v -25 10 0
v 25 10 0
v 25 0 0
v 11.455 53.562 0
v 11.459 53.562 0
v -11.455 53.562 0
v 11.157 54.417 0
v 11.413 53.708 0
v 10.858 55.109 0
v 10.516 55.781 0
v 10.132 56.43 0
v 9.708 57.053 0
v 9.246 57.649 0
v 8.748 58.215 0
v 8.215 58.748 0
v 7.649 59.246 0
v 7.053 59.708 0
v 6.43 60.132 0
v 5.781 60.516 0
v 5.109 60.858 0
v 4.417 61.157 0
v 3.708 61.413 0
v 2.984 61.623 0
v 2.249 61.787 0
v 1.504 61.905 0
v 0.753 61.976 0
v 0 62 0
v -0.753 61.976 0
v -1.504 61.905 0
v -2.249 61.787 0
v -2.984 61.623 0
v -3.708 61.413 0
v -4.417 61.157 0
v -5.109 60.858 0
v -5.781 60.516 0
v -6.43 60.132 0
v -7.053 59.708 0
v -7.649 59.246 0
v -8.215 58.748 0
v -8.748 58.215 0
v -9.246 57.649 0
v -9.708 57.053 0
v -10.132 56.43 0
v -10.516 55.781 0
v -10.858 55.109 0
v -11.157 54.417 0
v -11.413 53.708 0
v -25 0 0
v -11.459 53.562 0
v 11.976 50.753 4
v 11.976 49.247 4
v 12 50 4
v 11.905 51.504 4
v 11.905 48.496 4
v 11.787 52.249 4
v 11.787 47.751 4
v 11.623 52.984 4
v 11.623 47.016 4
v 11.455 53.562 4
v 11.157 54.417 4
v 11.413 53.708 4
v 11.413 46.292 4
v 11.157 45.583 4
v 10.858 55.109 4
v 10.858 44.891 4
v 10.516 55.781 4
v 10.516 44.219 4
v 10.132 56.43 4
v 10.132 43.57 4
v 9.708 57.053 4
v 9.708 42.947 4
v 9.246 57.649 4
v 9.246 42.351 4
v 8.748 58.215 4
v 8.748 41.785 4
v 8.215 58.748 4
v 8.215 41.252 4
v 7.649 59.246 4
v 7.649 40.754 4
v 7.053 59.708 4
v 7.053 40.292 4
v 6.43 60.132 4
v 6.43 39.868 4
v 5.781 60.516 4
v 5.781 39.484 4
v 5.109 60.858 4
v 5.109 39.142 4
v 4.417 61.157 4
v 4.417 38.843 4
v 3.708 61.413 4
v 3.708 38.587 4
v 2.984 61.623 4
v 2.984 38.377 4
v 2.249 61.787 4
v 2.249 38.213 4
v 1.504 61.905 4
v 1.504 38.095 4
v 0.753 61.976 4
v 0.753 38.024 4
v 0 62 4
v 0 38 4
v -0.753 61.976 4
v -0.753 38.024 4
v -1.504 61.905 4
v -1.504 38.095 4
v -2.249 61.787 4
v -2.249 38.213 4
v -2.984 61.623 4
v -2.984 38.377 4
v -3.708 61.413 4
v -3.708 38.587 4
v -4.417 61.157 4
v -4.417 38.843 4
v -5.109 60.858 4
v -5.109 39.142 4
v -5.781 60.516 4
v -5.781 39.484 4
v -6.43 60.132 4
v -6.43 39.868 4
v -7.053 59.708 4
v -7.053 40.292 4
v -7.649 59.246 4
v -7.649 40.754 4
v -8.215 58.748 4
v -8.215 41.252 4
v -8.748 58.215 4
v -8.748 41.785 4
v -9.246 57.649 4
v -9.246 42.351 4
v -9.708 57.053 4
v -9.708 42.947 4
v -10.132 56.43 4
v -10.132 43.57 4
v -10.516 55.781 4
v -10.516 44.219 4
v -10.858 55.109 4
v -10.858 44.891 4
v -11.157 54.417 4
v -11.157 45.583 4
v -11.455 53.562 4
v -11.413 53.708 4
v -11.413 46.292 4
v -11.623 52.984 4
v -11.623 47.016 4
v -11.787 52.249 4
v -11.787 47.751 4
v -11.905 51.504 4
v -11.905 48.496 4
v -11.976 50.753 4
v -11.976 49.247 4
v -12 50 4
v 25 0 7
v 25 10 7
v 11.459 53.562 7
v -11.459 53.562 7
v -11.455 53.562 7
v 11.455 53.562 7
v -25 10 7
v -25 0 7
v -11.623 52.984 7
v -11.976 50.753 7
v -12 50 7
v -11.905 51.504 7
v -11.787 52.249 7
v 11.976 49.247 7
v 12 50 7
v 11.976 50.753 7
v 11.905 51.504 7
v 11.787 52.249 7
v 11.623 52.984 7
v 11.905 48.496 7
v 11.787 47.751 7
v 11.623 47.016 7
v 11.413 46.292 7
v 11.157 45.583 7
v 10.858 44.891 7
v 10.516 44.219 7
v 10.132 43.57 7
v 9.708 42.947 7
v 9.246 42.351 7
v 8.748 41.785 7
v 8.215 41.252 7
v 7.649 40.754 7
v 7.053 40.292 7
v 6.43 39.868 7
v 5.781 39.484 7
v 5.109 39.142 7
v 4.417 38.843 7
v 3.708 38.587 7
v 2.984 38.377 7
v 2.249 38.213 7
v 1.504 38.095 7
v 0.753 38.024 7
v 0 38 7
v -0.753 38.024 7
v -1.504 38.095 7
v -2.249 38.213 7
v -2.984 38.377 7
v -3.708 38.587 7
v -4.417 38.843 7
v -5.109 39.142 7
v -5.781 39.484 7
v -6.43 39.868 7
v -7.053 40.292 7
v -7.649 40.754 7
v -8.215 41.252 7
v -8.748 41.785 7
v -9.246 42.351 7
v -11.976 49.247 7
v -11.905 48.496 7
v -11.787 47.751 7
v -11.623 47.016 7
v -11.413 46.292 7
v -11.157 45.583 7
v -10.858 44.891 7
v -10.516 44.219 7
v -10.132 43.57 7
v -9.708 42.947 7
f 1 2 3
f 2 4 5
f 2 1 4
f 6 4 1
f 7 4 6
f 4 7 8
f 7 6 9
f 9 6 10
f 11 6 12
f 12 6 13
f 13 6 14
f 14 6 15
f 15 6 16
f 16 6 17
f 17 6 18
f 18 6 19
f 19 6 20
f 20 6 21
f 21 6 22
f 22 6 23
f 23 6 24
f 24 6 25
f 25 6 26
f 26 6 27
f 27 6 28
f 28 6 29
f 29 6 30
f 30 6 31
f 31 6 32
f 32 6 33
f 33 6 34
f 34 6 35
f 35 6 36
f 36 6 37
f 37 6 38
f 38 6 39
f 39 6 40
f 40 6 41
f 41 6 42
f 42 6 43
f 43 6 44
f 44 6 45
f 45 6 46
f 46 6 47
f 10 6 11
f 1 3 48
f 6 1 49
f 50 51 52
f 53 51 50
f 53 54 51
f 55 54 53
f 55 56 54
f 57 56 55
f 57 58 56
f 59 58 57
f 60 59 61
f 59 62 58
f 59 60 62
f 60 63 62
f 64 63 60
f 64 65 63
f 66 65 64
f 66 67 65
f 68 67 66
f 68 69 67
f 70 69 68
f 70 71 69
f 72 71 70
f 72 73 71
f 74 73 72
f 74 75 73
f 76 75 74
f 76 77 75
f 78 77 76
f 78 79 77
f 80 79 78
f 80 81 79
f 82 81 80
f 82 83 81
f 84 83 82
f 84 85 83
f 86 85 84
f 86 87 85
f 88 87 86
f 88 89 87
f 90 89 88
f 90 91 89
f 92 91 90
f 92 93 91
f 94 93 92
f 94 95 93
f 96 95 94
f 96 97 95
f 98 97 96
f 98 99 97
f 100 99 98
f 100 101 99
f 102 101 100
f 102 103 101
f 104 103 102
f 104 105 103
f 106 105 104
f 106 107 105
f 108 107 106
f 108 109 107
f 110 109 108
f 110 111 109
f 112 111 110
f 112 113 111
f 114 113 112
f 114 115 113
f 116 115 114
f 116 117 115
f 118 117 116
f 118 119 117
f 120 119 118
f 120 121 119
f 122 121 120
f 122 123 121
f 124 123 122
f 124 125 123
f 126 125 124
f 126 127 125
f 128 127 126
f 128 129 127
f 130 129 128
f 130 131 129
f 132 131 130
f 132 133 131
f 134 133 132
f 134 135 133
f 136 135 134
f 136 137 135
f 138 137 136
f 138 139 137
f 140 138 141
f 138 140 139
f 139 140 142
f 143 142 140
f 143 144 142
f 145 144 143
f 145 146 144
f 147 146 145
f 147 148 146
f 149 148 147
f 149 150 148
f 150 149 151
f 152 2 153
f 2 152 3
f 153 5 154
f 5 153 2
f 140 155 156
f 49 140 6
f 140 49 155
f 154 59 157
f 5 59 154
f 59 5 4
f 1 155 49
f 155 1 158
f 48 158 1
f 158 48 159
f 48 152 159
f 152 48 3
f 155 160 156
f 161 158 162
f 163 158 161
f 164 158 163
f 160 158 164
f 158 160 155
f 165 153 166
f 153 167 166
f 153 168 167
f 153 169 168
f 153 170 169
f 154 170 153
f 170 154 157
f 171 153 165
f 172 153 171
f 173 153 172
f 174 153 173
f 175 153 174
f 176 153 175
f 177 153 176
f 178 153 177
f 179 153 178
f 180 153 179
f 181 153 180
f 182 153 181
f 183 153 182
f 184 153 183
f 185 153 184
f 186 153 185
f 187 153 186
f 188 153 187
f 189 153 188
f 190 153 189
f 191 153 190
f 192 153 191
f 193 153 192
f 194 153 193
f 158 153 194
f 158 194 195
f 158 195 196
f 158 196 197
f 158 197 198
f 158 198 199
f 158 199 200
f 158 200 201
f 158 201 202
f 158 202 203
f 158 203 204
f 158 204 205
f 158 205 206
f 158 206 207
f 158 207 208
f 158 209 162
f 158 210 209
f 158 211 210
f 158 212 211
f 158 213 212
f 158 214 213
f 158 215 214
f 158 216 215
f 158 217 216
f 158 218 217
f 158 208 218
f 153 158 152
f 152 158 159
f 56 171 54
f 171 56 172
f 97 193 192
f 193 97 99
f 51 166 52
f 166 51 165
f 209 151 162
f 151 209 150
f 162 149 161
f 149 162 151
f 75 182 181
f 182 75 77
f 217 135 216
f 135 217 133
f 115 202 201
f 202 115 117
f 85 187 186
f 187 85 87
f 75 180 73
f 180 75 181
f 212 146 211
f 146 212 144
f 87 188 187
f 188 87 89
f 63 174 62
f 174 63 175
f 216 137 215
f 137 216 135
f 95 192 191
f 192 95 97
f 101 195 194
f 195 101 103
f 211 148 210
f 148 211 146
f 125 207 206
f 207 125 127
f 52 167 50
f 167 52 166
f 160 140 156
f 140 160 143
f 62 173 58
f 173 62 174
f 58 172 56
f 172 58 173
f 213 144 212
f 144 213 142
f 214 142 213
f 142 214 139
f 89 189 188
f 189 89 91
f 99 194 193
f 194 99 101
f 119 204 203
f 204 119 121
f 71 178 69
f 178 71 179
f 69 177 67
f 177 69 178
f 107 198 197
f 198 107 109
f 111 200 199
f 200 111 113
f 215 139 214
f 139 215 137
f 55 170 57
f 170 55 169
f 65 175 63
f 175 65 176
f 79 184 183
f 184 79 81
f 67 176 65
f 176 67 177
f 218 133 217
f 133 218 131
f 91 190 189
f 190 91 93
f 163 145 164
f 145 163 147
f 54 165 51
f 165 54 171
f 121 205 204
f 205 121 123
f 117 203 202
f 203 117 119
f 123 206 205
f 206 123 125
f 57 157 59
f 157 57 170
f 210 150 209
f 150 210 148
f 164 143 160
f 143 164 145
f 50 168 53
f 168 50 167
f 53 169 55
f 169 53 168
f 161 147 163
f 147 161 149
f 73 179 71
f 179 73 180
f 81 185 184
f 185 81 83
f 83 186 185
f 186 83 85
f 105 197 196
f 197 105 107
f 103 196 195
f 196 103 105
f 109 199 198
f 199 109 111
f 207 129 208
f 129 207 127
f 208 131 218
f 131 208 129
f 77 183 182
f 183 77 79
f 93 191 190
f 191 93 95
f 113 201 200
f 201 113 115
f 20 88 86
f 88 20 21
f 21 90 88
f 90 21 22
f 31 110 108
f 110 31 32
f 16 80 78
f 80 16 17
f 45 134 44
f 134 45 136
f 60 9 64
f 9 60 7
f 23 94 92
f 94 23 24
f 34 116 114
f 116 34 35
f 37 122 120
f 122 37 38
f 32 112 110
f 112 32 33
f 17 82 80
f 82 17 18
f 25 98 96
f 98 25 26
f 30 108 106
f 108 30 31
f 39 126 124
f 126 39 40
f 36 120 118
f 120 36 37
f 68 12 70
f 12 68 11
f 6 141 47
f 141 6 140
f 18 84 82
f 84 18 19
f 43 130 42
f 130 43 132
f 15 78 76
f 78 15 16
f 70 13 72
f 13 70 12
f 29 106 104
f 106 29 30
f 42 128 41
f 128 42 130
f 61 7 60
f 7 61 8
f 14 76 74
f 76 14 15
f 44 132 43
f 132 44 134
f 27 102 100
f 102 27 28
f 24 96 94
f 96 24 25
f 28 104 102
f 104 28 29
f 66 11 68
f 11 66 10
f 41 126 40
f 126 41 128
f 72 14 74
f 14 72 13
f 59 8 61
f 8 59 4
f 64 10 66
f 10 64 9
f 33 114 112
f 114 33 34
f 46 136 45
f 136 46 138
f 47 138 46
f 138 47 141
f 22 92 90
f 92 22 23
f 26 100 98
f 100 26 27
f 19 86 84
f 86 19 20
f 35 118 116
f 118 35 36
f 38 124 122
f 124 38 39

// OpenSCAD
//-------------------------------------------------------------------------
//-- ear.scad
//-------------------------------------------------------------------------
//--This file has been generated automatically according to your data.
//--For more info, visit: http://iearobotics.com/oomlwiki/
//--------------------------------------------------------------------------

union() {
  linear_extrude(height=4.000, twist=0, $fn=100, convexity=10, center=false) {
    translate(v=[0.000, 50.000, 0.000]) {
      circle(r=12.000, $fn=100);
    } // End translate
  } // End linear_extrude
  difference() {
    polyhedron(points=[[0.000, 0.000, 0.000], [0.000, 0.000, 4.000], [25.000, 0.000, 0.000], [25.000, 0.000, 4.000], [25.000, 10.000, 0.000], [25.000, 10.000, 4.000], [11.459, 53.562, 0.000], [11.459, 53.562, 4.000], [-11.459, 53.562, 0.000], [-11.459, 53.562, 4.000], [-25.000, 10.000, 0.000], [-25.000, 10.000, 4.000], [-25.000, 0.000, 0.000], [-25.000, 0.000, 4.000]], triangles=[[1, 3, 5], [12, 10, 0], [1, 5, 7], [10, 8, 0], [1, 7, 9], [8, 6, 0], [1, 9, 11], [6, 4, 0], [1, 11, 13], [4, 2, 0], [0, 3, 1], [0, 2, 3], [2, 5, 3], [2, 4, 5], [4, 7, 5], [4, 6, 7], [6, 9, 7], [6, 8, 9], [8, 11, 9], [8, 10, 11], [10, 13, 11], [10, 12, 13], [12, 1, 13], [12, 0, 1]]);
    translate(v=[0.000, 50.000, 2.000]) {
      cylinder(h=4.100, r1=1.000, r2=1.000, $fn=100, center=true);
    } // End translate
  } // End difference
  translate(v=[0.000, 0.000, 4.000]) {
    difference() {
      polyhedron(points=[[0.000, 0.000, 0.000], [0.000, 0.000, 3.000], [25.000, 0.000, 0.000], [25.000, 0.000, 3.000], [25.000, 10.000, 0.000], [25.000, 10.000, 3.000], [11.459, 53.562, 0.000], [11.459, 53.562, 3.000], [-11.459, 53.562, 0.000], [-11.459, 53.562, 3.000], [-25.000, 10.000, 0.000], [-25.000, 10.000, 3.000], [-25.000, 0.000, 0.000], [-25.000, 0.000, 3.000]], triangles=[[1, 3, 5], [12, 10, 0], [1, 5, 7], [10, 8, 0], [1, 7, 9], [8, 6, 0], [1, 9, 11], [6, 4, 0], [1, 11, 13], [4, 2, 0], [0, 3, 1], [0, 2, 3], [2, 5, 3], [2, 4, 5], [4, 7, 5], [4, 6, 7], [6, 9, 7], [6, 8, 9], [8, 11, 9], [8, 10, 11], [10, 13, 11], [10, 12, 13], [12, 1, 13], [12, 0, 1]]);
      linear_extrude(height=3.000, twist=0, $fn=100, convexity=10, center=false) {
        translate(v=[0.000, 50.000, 0.000]) {
          circle(r=12.000, $fn=100);
        } // End translate
      } // End linear_extrude
    } // End difference
  } // End translate
} // End union
